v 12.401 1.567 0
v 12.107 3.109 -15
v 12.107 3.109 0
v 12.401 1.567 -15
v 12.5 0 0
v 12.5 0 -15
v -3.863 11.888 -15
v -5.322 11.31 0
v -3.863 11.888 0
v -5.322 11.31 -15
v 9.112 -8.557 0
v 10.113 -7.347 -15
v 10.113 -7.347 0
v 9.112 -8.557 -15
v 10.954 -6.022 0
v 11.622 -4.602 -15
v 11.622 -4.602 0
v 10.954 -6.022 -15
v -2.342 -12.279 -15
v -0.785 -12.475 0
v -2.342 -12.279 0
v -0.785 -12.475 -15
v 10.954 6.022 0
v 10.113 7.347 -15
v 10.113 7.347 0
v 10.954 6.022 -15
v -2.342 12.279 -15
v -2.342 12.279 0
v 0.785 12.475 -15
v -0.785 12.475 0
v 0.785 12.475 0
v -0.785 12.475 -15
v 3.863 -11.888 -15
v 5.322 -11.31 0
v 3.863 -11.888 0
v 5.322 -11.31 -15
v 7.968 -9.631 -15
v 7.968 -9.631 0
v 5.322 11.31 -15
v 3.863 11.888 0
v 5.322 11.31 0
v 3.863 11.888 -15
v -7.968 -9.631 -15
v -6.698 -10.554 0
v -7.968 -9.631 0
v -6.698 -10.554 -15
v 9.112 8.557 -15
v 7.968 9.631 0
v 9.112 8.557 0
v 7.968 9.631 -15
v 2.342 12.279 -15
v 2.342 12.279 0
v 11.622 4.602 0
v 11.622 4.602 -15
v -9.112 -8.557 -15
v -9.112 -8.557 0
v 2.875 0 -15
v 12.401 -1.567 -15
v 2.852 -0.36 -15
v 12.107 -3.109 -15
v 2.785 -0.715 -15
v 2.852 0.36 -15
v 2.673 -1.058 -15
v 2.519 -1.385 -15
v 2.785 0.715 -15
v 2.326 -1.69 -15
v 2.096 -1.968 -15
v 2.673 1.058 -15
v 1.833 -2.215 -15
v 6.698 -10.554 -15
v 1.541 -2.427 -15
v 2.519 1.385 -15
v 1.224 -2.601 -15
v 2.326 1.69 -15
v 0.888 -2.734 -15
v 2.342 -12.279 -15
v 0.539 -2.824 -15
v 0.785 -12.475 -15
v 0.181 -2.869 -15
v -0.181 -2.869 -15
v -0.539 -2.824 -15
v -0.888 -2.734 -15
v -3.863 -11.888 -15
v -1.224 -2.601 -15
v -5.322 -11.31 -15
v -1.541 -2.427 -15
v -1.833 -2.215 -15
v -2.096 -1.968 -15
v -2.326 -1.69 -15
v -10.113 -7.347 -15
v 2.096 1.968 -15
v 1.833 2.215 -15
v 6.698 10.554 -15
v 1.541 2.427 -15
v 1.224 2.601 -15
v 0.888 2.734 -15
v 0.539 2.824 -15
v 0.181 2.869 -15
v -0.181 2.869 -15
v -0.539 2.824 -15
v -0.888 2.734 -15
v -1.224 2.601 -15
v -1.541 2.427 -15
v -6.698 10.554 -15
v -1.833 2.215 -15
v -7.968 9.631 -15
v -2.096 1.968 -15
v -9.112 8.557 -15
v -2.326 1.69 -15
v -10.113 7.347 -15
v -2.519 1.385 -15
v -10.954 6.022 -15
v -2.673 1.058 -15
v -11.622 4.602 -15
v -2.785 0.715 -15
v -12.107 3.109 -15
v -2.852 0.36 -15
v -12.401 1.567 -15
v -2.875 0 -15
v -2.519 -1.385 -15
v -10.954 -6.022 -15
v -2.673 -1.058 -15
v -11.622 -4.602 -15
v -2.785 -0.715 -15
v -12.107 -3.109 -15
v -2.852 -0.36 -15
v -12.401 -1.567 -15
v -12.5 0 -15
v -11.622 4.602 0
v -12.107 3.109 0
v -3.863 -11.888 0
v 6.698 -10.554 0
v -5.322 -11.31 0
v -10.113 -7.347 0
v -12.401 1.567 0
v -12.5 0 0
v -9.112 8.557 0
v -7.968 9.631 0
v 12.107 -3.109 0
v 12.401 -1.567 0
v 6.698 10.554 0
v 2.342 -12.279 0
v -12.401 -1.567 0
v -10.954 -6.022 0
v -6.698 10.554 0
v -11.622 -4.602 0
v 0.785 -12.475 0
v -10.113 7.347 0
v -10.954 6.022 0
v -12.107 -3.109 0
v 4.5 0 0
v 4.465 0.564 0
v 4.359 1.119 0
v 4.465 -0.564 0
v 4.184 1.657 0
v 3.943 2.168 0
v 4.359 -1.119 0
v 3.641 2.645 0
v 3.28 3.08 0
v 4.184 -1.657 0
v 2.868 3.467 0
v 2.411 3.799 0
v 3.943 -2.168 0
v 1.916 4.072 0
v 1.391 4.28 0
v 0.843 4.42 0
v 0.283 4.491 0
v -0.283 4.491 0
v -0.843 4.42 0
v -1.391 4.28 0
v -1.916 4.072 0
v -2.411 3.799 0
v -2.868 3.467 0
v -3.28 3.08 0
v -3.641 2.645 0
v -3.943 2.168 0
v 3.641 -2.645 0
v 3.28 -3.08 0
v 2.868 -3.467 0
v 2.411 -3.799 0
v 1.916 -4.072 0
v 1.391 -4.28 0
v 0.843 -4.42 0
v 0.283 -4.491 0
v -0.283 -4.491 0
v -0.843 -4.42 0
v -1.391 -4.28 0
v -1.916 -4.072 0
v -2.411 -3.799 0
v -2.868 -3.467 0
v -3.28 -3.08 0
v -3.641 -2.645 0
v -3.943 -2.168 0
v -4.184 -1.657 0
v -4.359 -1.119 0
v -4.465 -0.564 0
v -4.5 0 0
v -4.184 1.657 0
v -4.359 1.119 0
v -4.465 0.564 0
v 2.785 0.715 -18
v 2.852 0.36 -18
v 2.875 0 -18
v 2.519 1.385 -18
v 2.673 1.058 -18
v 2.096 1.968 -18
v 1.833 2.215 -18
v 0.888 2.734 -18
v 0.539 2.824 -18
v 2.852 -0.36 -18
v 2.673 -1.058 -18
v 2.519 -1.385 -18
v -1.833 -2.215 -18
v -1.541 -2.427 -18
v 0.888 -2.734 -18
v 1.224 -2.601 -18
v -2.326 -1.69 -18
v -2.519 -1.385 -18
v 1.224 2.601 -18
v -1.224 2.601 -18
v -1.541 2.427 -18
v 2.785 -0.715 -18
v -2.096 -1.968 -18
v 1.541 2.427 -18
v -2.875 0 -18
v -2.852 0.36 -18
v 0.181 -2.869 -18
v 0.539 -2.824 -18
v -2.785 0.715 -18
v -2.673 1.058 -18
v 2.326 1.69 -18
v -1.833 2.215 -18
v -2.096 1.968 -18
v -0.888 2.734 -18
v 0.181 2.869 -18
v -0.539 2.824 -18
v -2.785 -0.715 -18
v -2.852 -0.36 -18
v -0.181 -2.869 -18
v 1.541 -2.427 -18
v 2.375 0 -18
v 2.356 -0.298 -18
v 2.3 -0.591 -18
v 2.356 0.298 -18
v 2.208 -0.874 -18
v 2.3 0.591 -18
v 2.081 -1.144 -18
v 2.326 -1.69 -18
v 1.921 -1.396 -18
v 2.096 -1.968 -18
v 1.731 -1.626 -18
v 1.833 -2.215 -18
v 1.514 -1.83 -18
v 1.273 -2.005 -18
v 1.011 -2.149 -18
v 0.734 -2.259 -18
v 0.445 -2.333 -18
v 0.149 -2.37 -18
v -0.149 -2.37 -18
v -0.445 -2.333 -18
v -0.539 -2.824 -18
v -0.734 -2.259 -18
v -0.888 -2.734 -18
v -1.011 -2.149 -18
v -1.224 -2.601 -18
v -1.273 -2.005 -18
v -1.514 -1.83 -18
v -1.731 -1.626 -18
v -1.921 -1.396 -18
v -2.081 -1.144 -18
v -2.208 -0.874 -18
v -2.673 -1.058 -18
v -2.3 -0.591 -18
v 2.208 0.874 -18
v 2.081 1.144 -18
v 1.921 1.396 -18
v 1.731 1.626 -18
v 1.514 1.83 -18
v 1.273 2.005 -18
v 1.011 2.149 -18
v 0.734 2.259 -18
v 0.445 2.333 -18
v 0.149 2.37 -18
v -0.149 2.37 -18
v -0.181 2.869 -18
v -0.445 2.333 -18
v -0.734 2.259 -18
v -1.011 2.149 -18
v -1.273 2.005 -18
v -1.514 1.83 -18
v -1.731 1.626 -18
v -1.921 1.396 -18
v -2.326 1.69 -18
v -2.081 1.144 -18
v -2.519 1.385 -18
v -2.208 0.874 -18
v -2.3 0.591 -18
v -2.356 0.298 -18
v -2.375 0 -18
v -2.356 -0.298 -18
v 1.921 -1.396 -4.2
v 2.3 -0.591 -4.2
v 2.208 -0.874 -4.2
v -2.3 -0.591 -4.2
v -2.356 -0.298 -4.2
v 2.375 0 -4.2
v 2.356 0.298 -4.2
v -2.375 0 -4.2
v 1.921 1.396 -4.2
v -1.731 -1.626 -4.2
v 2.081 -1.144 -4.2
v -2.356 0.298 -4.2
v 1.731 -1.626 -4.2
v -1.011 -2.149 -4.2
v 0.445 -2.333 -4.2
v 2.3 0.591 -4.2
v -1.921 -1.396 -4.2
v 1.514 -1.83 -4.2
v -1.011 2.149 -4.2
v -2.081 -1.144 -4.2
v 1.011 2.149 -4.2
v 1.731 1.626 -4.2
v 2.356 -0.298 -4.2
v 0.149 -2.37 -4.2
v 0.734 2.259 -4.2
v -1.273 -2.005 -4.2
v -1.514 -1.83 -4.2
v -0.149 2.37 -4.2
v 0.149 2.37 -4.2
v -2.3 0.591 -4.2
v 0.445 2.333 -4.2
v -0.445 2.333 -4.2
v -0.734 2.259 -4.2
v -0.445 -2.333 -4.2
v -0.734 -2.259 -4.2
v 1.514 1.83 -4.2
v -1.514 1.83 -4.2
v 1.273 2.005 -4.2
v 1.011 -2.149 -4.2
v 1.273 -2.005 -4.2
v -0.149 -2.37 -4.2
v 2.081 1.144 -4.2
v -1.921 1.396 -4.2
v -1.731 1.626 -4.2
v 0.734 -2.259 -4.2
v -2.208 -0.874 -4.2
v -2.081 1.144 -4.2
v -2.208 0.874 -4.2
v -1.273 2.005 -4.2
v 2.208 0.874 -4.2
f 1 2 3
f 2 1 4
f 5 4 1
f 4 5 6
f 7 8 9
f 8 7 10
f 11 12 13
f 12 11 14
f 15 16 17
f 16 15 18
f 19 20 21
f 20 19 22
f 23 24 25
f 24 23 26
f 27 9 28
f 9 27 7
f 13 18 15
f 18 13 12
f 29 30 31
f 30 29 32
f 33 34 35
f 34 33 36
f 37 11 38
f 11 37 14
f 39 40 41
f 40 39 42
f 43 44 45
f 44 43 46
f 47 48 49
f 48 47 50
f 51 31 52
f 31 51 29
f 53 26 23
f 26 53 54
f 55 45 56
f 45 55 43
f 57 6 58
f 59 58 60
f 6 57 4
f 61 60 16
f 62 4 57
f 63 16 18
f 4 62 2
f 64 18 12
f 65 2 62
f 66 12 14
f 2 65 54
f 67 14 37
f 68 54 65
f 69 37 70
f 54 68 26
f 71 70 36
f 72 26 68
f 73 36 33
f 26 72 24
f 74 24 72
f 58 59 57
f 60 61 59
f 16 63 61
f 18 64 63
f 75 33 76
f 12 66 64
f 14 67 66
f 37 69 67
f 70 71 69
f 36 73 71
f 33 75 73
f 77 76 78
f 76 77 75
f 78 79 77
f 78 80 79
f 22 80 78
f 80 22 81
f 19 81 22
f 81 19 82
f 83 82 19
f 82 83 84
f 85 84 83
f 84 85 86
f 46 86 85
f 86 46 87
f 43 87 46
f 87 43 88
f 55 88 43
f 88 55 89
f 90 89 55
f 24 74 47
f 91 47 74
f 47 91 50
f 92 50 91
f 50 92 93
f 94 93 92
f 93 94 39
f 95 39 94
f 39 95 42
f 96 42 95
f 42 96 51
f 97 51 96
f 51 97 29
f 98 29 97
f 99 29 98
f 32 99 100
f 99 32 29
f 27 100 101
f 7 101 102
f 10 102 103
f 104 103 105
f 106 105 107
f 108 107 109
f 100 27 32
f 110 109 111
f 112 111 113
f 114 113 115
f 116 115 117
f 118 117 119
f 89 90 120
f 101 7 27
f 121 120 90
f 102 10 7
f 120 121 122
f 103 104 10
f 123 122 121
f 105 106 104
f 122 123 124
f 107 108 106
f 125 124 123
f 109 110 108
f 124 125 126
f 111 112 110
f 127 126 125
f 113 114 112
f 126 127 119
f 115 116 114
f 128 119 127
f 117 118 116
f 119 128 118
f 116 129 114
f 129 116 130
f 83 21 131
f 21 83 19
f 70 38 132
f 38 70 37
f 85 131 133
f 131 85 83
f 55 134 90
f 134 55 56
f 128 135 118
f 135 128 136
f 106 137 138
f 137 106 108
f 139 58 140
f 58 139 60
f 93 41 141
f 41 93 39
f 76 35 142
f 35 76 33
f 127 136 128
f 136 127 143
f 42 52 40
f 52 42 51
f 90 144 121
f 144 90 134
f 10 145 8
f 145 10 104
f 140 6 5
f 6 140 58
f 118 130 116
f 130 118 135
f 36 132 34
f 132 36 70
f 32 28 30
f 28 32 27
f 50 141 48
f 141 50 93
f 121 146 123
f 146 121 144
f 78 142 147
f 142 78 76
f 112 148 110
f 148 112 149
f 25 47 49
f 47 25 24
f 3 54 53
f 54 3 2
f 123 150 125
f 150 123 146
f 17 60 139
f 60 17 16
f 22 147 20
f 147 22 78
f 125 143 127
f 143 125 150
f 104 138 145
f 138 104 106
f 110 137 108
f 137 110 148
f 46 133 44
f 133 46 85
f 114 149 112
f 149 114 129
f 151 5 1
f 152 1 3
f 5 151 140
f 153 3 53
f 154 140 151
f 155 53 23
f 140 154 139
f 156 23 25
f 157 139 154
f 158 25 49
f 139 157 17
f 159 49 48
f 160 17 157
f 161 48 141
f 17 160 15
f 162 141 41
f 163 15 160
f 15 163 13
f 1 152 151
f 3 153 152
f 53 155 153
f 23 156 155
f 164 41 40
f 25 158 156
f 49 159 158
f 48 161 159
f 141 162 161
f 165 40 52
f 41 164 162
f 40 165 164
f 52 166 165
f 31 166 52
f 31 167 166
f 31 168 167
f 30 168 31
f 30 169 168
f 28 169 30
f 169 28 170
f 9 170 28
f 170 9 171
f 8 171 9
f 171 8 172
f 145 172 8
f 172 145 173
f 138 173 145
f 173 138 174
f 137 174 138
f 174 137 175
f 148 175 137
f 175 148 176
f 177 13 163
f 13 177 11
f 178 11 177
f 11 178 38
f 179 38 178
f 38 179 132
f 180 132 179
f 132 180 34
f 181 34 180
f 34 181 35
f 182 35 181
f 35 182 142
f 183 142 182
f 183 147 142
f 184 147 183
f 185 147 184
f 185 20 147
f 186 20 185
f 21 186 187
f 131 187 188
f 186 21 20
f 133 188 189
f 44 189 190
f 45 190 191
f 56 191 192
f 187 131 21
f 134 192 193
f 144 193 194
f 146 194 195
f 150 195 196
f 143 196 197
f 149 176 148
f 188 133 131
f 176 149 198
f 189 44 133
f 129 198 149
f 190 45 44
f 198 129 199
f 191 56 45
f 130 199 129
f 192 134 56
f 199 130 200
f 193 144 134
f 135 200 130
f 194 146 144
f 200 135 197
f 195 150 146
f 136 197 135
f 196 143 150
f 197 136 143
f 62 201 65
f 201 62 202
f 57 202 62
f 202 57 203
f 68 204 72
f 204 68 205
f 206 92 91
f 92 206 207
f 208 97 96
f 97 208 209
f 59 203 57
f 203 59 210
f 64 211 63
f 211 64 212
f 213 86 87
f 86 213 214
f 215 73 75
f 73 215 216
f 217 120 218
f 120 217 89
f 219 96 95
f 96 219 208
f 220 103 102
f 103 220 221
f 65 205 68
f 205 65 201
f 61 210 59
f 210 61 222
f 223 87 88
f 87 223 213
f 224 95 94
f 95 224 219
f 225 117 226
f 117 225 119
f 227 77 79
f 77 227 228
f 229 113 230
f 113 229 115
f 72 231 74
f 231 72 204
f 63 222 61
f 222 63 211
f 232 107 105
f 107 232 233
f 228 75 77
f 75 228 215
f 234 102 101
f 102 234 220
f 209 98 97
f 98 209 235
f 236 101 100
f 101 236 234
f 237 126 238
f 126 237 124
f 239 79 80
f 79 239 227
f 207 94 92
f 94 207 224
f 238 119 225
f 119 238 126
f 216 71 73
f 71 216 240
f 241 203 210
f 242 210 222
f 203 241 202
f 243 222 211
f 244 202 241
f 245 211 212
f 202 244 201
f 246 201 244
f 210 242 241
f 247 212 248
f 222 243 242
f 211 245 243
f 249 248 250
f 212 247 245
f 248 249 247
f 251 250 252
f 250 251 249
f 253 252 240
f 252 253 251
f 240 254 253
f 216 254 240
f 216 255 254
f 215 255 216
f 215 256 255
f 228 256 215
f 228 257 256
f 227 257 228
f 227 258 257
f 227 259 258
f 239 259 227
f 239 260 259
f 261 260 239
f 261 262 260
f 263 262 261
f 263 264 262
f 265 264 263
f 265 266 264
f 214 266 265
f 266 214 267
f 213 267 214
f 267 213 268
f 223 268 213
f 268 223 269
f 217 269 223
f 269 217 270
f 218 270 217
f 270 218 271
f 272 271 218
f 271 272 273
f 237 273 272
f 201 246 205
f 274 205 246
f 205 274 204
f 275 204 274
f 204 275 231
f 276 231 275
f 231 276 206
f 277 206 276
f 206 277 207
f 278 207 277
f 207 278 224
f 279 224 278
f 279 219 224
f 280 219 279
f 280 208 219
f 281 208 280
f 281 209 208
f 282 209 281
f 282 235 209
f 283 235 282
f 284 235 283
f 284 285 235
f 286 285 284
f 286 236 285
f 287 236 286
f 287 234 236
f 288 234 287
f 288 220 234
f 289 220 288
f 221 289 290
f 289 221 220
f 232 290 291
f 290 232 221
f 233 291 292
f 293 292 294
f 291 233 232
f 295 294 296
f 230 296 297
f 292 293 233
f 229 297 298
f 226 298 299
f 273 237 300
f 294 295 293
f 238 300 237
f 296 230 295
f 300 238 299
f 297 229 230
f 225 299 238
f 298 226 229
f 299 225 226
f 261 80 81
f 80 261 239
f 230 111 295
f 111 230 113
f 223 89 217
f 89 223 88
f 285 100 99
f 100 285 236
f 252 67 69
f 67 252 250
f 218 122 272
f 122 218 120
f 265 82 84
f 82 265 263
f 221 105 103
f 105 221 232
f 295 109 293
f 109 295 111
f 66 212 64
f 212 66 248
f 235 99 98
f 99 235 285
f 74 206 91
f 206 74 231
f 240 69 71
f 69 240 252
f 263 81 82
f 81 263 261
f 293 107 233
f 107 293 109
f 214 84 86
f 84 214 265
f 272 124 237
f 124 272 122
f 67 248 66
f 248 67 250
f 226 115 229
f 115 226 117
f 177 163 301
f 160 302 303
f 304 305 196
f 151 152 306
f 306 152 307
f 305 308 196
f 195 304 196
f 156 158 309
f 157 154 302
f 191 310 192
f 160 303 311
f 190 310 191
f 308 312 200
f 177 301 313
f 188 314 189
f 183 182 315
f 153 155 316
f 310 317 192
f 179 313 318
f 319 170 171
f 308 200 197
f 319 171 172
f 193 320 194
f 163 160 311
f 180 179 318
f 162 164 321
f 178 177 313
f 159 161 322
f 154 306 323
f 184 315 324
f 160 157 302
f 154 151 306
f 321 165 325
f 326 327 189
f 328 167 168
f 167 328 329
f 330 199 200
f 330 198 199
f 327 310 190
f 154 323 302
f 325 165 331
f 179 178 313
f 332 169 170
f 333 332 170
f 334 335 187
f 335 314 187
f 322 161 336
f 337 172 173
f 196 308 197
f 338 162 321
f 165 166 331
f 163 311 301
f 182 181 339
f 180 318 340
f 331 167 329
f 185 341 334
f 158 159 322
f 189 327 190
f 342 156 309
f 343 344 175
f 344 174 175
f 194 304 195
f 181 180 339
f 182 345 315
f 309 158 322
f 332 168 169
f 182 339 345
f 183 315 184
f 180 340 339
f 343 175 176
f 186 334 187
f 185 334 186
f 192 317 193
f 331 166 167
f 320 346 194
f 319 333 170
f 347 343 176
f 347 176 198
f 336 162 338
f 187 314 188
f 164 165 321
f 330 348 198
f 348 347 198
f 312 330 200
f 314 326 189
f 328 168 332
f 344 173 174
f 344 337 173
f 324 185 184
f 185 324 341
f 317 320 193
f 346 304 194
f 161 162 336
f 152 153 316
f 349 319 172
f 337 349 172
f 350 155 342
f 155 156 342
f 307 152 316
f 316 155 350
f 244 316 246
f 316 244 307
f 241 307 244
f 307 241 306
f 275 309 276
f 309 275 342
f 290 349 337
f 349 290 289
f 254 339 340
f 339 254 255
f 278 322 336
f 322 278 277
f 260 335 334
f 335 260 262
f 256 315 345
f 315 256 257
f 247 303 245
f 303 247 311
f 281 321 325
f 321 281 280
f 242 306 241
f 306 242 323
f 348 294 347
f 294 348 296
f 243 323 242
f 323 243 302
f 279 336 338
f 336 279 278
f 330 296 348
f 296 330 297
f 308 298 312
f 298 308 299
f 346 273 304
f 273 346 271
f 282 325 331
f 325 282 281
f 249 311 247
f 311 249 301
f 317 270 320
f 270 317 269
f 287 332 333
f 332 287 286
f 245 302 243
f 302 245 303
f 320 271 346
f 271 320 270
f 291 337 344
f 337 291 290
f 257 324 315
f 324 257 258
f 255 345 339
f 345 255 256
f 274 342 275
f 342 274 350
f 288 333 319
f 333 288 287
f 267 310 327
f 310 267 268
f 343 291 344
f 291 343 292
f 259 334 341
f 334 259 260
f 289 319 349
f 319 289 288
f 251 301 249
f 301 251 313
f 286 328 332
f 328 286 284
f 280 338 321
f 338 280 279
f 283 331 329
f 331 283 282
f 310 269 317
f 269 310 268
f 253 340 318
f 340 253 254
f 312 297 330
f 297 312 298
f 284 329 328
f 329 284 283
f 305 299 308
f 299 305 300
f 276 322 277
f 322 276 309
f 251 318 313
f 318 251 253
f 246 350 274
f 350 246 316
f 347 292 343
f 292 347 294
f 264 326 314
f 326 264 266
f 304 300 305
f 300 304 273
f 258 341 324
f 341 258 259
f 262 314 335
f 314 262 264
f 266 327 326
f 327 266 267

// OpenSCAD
$fn = 50;

difference() {
	union() {
		translate(v = [0, 0, -15.0]) {
			cylinder(h = 15, r = 12.5);
		}
		#translate(v = [0, 0, -18.0]) {
			cylinder(h = 18, r = 2.875);
		}
	}
	union() {
		translate(v = [0, 0, 0]) {
			rotate(a = [0, 0, 0]) {
				difference() {
					union() {
						translate(v = [0, 0, -18.0]) {
							cylinder(h = 18, r = 2.25);
						}
						translate(v = [0, 0, -4.2]) {
							cylinder(h = 4.2, r1 = 2.375, r2 = 4.5);
						}
						translate(v = [0, 0, -18.0]) {
							cylinder(h = 18, r = 2.375);
						}
						translate(v = [0, 0, -18.0]) {
							cylinder(h = 18, r = 2.25);
						}
					}
					union();
				}
			}
		}
	}
}
